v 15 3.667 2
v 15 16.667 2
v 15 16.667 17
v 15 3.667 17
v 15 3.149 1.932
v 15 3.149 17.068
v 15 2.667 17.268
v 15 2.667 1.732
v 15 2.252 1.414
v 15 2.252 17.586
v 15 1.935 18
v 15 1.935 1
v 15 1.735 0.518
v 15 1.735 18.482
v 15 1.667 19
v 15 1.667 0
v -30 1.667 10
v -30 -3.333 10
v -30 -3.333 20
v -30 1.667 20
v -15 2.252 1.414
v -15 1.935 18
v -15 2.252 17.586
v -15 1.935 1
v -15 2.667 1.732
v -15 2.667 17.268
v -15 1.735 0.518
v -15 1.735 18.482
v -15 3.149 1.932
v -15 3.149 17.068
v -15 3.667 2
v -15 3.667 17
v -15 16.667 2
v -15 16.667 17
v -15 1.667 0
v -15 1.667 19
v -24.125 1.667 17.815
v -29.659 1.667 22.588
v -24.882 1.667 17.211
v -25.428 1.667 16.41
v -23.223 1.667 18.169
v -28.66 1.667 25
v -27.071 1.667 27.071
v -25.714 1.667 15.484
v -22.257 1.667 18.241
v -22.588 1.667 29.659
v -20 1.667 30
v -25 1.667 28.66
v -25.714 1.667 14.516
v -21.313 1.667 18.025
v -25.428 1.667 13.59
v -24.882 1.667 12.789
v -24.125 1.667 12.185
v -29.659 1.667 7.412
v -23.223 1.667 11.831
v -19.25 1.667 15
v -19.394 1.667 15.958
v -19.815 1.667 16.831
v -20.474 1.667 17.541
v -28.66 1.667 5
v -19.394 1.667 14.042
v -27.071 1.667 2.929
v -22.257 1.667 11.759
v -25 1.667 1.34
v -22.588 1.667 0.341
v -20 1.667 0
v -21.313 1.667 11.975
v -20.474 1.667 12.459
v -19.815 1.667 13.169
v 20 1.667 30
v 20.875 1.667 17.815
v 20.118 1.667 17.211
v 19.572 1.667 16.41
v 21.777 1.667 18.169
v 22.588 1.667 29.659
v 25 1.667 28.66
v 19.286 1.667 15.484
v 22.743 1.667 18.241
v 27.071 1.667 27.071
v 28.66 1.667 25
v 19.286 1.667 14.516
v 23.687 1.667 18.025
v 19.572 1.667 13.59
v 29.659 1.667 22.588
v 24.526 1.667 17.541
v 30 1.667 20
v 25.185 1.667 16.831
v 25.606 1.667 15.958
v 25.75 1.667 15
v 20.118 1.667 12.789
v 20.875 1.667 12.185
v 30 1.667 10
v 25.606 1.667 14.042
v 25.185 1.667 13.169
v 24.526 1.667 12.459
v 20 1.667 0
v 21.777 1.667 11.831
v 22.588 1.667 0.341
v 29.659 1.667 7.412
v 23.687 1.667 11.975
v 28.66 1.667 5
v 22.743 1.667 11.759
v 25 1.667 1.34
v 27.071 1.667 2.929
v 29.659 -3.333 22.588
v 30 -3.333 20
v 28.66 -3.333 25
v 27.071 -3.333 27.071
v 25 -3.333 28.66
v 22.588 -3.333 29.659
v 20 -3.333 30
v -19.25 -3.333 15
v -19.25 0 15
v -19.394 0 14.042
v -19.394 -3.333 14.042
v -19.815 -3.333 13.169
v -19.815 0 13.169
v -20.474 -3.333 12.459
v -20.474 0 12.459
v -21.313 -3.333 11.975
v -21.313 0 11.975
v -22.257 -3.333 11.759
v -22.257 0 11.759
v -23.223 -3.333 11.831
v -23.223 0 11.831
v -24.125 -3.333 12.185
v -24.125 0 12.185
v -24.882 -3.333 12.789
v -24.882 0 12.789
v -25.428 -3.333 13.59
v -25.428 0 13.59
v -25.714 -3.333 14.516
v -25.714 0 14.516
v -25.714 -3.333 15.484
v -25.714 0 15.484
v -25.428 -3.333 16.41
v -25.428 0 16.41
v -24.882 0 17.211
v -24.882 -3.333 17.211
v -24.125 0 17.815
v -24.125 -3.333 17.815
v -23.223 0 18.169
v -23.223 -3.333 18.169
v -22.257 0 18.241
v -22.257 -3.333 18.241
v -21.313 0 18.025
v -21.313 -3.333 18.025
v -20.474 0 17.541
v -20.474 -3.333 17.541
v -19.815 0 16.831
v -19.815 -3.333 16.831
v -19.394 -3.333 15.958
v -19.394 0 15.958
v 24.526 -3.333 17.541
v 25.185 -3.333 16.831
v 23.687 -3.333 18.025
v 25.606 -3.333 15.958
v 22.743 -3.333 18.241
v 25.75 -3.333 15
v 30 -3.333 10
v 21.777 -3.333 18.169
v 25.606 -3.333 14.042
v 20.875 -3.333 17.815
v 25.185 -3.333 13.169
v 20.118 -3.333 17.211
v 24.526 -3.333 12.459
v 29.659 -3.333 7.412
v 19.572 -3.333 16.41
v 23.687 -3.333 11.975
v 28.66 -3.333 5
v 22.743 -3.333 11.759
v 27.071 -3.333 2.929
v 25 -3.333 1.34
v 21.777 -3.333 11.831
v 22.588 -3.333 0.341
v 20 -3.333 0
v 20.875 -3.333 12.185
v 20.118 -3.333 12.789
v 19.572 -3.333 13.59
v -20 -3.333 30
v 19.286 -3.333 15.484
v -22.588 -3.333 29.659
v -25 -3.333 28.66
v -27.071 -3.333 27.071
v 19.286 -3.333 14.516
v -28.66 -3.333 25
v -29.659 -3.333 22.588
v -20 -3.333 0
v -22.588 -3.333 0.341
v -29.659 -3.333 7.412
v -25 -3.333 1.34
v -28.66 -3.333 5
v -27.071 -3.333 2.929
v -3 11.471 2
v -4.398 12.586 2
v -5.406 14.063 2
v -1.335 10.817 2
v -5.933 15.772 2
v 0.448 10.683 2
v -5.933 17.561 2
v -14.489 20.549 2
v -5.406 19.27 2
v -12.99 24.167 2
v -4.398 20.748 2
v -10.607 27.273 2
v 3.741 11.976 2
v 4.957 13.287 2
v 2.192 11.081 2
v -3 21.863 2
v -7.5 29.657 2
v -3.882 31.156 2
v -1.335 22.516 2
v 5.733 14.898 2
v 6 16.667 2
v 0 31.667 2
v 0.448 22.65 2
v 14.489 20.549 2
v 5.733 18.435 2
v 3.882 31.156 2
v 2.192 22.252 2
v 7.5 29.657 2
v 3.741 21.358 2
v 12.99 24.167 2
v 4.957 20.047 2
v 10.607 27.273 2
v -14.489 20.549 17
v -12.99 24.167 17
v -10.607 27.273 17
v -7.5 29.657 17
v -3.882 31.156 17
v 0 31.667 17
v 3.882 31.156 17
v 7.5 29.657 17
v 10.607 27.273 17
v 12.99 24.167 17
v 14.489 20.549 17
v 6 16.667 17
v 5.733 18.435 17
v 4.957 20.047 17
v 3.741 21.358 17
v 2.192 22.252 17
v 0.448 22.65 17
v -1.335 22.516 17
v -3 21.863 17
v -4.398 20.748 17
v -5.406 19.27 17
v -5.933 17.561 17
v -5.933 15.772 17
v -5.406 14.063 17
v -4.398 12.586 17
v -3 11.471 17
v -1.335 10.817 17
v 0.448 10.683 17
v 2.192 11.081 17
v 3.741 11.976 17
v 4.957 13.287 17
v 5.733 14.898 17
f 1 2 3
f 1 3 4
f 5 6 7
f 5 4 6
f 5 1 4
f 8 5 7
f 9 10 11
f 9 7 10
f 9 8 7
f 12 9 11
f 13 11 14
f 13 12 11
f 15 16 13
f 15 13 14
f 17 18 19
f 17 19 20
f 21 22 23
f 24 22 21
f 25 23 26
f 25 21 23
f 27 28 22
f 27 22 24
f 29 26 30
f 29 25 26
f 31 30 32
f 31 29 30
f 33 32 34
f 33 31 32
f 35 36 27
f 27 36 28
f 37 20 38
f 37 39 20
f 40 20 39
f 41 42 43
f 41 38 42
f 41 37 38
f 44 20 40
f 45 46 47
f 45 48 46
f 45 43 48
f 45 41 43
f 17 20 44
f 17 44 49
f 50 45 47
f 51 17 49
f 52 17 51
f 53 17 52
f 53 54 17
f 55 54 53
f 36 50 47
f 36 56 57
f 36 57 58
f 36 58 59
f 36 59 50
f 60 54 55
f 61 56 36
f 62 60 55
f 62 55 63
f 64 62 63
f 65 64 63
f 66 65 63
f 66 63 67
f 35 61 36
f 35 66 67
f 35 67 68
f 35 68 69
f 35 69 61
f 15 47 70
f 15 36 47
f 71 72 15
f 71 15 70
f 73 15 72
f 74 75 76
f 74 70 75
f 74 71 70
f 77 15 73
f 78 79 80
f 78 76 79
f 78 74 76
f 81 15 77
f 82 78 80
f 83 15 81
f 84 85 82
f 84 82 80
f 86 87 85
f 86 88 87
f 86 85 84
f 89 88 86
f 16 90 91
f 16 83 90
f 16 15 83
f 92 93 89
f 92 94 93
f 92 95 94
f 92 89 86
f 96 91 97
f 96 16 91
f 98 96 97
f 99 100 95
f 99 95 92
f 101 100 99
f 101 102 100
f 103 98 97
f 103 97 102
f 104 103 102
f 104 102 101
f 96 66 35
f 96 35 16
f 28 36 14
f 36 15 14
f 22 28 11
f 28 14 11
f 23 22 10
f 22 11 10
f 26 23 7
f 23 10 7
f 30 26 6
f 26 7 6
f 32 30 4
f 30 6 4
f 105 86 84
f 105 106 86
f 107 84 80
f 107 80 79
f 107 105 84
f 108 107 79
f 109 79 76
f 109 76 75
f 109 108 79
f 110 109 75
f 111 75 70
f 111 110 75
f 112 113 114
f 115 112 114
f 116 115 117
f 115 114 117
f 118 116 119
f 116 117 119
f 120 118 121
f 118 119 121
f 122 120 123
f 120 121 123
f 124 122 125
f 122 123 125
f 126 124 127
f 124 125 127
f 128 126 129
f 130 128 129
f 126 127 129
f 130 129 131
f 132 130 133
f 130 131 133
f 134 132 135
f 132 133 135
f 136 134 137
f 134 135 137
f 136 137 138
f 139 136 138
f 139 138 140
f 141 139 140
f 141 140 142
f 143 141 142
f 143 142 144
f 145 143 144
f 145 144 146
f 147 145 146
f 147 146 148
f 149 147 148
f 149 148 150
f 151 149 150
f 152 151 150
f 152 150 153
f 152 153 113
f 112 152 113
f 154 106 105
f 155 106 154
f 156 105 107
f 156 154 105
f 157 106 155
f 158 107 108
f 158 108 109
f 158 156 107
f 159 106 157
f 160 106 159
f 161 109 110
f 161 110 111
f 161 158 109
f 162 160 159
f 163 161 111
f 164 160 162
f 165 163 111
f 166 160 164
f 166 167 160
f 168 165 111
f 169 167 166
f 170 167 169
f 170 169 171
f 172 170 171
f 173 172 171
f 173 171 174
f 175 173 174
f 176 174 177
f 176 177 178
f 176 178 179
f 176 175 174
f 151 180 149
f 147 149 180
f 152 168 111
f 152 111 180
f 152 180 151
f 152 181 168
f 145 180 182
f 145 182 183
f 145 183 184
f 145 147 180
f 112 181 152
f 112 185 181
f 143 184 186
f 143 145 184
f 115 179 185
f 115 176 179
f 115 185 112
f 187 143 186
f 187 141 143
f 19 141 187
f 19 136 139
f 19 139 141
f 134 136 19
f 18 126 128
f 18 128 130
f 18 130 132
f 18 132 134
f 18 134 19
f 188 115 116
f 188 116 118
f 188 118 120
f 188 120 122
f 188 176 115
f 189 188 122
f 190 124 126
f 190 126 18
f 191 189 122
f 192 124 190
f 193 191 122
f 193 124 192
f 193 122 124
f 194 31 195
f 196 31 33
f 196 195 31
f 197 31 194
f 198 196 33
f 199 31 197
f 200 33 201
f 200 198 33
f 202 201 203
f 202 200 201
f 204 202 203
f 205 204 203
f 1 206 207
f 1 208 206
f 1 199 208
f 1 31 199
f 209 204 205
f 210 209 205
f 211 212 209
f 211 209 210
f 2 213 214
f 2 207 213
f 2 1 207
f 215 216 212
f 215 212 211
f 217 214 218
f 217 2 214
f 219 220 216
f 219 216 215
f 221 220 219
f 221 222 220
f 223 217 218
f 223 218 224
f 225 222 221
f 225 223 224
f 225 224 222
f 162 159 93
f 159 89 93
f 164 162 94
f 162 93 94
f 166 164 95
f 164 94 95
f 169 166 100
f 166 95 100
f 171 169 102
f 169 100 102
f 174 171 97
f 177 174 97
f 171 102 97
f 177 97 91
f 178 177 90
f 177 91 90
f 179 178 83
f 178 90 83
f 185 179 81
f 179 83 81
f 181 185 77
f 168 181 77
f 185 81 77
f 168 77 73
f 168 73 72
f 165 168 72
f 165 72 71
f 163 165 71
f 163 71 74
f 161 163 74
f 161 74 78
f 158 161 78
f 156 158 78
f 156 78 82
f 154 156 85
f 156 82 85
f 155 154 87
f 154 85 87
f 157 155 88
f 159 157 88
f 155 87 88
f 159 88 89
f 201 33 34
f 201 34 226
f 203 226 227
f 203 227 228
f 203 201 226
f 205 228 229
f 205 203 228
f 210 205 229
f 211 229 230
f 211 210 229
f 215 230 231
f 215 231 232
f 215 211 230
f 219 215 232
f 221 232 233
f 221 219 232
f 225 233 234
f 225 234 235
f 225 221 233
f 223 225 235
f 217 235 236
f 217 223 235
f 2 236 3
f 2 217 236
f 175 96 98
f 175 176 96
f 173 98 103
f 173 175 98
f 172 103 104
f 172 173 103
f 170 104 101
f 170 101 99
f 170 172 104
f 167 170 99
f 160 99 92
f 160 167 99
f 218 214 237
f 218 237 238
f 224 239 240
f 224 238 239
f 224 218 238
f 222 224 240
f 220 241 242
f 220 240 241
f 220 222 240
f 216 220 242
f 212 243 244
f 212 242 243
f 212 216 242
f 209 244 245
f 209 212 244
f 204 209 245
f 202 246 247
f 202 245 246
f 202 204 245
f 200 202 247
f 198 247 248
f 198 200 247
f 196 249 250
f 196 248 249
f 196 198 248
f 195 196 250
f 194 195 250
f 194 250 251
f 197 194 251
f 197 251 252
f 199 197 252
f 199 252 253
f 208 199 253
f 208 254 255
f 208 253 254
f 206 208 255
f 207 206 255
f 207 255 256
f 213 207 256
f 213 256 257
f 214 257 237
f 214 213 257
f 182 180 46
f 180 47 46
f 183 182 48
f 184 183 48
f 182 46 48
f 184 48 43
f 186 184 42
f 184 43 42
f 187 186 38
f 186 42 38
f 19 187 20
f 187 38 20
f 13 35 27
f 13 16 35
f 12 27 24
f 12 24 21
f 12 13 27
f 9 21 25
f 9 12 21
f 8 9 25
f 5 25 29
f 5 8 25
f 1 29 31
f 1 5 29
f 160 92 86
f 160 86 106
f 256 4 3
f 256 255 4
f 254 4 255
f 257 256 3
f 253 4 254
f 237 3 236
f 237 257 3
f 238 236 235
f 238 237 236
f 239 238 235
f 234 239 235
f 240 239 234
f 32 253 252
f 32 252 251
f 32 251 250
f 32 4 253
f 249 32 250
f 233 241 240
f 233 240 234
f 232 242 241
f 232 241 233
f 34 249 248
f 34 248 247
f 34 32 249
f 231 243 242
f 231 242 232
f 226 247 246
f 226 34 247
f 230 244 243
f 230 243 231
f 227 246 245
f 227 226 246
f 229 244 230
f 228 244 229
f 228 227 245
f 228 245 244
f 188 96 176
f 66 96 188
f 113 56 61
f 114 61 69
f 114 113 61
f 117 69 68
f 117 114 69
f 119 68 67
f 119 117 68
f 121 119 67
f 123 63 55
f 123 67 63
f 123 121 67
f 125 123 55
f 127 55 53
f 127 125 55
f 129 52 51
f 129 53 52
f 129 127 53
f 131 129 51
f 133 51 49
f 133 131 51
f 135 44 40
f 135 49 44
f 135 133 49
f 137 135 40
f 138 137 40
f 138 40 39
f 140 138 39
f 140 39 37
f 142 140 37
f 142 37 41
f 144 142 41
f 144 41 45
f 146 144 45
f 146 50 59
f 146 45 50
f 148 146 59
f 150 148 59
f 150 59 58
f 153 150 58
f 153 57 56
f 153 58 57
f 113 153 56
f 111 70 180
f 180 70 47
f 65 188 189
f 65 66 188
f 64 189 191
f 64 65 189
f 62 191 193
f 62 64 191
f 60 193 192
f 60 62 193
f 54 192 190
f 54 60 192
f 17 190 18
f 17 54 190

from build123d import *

# Parameters (mm, degrees)
SKETCH_1_R          = 6
EXTRUDE_1_DEPTH     = 30
SKETCH_2_W          = 13
SKETCH_2_H          = 30
SKETCH_2_W_2        = 2
CUT_EXTRUDE_1_DEPTH = 15
SKETCH_3_R          = 3.25
CUT_EXTRUDE_2_DEPTH = 15
FILLET_1_R          = 2
FILLET_2_R          = 10


with BuildPart() as part:
    # 草图1 → 凸台-拉伸1 (new body)
    with BuildSketch(Plane.XY):
        with BuildLine():
            Line((-30, 1.666666667), (-15, 1.666666667))
            Line((-15, 1.666666667), (-15, 16.666666667))
            ThreePointArc((-15, 16.666666667), (0, 31.666666667), (15, 16.666666667))
            Line((15, 16.666666667), (15, 1.666666667))
            Line((15, 1.666666667), (30, 1.666666667))
            Line((30, 1.666666667), (30, -3.333333333))
            Line((30, -3.333333333), (-30, -3.333333333))
            Line((-30, -3.333333333), (-30, 1.666666667))
        make_face()
        with Locations((0, 16.666666667)):
            Circle(SKETCH_1_R, mode=Mode.SUBTRACT)
    extrude(amount=EXTRUDE_1_DEPTH)

    # 草图2 → 切除-拉伸1 (cut, symmetric)
    with BuildSketch(Plane(origin=(0, 0, 0), x_dir=(0, 0, -1), z_dir=(1, 0, 0))):
        with Locations((-23.5, 16.666666667)):
            Rectangle(SKETCH_2_W, SKETCH_2_H)
        with Locations((-1, 16.666666667)):
            Rectangle(SKETCH_2_W_2, SKETCH_2_H)
    extrude(amount=CUT_EXTRUDE_1_DEPTH, both=True, mode=Mode.SUBTRACT)

    # 草图3 → 切除-拉伸2 (cut, symmetric)
    with BuildSketch(Plane(origin=(0, 0, 0), x_dir=(1, 0, 0), z_dir=(0, 1, 0))):
        with Locations((-22.5, -15)):
            Circle(SKETCH_3_R)
        with Locations((22.5, -15)):
            Circle(SKETCH_3_R)
    extrude(amount=CUT_EXTRUDE_2_DEPTH, both=True, mode=Mode.SUBTRACT)

    # 圆角1
    fillet_1_edges = [part.edges().sort_by_distance(p)[0] for p in [
        (0, 1.666666667, 17),
        (0, 1.666666667, 2),
    ]]
    fillet(fillet_1_edges, radius=FILLET_1_R - 0.0001)  # a hair under: the kernel refuses the full size

    # 圆角2
    fillet_2_edges = [part.edges().sort_by_distance(p)[0] for p in [
        (30, -0.833333333, 30),
        (-30, -0.833333333, 0),
        (-30, -0.833333333, 30),
        (30, -0.833333333, 0),
    ]]
    fillet(fillet_2_edges, radius=FILLET_2_R)


solid = part.part
